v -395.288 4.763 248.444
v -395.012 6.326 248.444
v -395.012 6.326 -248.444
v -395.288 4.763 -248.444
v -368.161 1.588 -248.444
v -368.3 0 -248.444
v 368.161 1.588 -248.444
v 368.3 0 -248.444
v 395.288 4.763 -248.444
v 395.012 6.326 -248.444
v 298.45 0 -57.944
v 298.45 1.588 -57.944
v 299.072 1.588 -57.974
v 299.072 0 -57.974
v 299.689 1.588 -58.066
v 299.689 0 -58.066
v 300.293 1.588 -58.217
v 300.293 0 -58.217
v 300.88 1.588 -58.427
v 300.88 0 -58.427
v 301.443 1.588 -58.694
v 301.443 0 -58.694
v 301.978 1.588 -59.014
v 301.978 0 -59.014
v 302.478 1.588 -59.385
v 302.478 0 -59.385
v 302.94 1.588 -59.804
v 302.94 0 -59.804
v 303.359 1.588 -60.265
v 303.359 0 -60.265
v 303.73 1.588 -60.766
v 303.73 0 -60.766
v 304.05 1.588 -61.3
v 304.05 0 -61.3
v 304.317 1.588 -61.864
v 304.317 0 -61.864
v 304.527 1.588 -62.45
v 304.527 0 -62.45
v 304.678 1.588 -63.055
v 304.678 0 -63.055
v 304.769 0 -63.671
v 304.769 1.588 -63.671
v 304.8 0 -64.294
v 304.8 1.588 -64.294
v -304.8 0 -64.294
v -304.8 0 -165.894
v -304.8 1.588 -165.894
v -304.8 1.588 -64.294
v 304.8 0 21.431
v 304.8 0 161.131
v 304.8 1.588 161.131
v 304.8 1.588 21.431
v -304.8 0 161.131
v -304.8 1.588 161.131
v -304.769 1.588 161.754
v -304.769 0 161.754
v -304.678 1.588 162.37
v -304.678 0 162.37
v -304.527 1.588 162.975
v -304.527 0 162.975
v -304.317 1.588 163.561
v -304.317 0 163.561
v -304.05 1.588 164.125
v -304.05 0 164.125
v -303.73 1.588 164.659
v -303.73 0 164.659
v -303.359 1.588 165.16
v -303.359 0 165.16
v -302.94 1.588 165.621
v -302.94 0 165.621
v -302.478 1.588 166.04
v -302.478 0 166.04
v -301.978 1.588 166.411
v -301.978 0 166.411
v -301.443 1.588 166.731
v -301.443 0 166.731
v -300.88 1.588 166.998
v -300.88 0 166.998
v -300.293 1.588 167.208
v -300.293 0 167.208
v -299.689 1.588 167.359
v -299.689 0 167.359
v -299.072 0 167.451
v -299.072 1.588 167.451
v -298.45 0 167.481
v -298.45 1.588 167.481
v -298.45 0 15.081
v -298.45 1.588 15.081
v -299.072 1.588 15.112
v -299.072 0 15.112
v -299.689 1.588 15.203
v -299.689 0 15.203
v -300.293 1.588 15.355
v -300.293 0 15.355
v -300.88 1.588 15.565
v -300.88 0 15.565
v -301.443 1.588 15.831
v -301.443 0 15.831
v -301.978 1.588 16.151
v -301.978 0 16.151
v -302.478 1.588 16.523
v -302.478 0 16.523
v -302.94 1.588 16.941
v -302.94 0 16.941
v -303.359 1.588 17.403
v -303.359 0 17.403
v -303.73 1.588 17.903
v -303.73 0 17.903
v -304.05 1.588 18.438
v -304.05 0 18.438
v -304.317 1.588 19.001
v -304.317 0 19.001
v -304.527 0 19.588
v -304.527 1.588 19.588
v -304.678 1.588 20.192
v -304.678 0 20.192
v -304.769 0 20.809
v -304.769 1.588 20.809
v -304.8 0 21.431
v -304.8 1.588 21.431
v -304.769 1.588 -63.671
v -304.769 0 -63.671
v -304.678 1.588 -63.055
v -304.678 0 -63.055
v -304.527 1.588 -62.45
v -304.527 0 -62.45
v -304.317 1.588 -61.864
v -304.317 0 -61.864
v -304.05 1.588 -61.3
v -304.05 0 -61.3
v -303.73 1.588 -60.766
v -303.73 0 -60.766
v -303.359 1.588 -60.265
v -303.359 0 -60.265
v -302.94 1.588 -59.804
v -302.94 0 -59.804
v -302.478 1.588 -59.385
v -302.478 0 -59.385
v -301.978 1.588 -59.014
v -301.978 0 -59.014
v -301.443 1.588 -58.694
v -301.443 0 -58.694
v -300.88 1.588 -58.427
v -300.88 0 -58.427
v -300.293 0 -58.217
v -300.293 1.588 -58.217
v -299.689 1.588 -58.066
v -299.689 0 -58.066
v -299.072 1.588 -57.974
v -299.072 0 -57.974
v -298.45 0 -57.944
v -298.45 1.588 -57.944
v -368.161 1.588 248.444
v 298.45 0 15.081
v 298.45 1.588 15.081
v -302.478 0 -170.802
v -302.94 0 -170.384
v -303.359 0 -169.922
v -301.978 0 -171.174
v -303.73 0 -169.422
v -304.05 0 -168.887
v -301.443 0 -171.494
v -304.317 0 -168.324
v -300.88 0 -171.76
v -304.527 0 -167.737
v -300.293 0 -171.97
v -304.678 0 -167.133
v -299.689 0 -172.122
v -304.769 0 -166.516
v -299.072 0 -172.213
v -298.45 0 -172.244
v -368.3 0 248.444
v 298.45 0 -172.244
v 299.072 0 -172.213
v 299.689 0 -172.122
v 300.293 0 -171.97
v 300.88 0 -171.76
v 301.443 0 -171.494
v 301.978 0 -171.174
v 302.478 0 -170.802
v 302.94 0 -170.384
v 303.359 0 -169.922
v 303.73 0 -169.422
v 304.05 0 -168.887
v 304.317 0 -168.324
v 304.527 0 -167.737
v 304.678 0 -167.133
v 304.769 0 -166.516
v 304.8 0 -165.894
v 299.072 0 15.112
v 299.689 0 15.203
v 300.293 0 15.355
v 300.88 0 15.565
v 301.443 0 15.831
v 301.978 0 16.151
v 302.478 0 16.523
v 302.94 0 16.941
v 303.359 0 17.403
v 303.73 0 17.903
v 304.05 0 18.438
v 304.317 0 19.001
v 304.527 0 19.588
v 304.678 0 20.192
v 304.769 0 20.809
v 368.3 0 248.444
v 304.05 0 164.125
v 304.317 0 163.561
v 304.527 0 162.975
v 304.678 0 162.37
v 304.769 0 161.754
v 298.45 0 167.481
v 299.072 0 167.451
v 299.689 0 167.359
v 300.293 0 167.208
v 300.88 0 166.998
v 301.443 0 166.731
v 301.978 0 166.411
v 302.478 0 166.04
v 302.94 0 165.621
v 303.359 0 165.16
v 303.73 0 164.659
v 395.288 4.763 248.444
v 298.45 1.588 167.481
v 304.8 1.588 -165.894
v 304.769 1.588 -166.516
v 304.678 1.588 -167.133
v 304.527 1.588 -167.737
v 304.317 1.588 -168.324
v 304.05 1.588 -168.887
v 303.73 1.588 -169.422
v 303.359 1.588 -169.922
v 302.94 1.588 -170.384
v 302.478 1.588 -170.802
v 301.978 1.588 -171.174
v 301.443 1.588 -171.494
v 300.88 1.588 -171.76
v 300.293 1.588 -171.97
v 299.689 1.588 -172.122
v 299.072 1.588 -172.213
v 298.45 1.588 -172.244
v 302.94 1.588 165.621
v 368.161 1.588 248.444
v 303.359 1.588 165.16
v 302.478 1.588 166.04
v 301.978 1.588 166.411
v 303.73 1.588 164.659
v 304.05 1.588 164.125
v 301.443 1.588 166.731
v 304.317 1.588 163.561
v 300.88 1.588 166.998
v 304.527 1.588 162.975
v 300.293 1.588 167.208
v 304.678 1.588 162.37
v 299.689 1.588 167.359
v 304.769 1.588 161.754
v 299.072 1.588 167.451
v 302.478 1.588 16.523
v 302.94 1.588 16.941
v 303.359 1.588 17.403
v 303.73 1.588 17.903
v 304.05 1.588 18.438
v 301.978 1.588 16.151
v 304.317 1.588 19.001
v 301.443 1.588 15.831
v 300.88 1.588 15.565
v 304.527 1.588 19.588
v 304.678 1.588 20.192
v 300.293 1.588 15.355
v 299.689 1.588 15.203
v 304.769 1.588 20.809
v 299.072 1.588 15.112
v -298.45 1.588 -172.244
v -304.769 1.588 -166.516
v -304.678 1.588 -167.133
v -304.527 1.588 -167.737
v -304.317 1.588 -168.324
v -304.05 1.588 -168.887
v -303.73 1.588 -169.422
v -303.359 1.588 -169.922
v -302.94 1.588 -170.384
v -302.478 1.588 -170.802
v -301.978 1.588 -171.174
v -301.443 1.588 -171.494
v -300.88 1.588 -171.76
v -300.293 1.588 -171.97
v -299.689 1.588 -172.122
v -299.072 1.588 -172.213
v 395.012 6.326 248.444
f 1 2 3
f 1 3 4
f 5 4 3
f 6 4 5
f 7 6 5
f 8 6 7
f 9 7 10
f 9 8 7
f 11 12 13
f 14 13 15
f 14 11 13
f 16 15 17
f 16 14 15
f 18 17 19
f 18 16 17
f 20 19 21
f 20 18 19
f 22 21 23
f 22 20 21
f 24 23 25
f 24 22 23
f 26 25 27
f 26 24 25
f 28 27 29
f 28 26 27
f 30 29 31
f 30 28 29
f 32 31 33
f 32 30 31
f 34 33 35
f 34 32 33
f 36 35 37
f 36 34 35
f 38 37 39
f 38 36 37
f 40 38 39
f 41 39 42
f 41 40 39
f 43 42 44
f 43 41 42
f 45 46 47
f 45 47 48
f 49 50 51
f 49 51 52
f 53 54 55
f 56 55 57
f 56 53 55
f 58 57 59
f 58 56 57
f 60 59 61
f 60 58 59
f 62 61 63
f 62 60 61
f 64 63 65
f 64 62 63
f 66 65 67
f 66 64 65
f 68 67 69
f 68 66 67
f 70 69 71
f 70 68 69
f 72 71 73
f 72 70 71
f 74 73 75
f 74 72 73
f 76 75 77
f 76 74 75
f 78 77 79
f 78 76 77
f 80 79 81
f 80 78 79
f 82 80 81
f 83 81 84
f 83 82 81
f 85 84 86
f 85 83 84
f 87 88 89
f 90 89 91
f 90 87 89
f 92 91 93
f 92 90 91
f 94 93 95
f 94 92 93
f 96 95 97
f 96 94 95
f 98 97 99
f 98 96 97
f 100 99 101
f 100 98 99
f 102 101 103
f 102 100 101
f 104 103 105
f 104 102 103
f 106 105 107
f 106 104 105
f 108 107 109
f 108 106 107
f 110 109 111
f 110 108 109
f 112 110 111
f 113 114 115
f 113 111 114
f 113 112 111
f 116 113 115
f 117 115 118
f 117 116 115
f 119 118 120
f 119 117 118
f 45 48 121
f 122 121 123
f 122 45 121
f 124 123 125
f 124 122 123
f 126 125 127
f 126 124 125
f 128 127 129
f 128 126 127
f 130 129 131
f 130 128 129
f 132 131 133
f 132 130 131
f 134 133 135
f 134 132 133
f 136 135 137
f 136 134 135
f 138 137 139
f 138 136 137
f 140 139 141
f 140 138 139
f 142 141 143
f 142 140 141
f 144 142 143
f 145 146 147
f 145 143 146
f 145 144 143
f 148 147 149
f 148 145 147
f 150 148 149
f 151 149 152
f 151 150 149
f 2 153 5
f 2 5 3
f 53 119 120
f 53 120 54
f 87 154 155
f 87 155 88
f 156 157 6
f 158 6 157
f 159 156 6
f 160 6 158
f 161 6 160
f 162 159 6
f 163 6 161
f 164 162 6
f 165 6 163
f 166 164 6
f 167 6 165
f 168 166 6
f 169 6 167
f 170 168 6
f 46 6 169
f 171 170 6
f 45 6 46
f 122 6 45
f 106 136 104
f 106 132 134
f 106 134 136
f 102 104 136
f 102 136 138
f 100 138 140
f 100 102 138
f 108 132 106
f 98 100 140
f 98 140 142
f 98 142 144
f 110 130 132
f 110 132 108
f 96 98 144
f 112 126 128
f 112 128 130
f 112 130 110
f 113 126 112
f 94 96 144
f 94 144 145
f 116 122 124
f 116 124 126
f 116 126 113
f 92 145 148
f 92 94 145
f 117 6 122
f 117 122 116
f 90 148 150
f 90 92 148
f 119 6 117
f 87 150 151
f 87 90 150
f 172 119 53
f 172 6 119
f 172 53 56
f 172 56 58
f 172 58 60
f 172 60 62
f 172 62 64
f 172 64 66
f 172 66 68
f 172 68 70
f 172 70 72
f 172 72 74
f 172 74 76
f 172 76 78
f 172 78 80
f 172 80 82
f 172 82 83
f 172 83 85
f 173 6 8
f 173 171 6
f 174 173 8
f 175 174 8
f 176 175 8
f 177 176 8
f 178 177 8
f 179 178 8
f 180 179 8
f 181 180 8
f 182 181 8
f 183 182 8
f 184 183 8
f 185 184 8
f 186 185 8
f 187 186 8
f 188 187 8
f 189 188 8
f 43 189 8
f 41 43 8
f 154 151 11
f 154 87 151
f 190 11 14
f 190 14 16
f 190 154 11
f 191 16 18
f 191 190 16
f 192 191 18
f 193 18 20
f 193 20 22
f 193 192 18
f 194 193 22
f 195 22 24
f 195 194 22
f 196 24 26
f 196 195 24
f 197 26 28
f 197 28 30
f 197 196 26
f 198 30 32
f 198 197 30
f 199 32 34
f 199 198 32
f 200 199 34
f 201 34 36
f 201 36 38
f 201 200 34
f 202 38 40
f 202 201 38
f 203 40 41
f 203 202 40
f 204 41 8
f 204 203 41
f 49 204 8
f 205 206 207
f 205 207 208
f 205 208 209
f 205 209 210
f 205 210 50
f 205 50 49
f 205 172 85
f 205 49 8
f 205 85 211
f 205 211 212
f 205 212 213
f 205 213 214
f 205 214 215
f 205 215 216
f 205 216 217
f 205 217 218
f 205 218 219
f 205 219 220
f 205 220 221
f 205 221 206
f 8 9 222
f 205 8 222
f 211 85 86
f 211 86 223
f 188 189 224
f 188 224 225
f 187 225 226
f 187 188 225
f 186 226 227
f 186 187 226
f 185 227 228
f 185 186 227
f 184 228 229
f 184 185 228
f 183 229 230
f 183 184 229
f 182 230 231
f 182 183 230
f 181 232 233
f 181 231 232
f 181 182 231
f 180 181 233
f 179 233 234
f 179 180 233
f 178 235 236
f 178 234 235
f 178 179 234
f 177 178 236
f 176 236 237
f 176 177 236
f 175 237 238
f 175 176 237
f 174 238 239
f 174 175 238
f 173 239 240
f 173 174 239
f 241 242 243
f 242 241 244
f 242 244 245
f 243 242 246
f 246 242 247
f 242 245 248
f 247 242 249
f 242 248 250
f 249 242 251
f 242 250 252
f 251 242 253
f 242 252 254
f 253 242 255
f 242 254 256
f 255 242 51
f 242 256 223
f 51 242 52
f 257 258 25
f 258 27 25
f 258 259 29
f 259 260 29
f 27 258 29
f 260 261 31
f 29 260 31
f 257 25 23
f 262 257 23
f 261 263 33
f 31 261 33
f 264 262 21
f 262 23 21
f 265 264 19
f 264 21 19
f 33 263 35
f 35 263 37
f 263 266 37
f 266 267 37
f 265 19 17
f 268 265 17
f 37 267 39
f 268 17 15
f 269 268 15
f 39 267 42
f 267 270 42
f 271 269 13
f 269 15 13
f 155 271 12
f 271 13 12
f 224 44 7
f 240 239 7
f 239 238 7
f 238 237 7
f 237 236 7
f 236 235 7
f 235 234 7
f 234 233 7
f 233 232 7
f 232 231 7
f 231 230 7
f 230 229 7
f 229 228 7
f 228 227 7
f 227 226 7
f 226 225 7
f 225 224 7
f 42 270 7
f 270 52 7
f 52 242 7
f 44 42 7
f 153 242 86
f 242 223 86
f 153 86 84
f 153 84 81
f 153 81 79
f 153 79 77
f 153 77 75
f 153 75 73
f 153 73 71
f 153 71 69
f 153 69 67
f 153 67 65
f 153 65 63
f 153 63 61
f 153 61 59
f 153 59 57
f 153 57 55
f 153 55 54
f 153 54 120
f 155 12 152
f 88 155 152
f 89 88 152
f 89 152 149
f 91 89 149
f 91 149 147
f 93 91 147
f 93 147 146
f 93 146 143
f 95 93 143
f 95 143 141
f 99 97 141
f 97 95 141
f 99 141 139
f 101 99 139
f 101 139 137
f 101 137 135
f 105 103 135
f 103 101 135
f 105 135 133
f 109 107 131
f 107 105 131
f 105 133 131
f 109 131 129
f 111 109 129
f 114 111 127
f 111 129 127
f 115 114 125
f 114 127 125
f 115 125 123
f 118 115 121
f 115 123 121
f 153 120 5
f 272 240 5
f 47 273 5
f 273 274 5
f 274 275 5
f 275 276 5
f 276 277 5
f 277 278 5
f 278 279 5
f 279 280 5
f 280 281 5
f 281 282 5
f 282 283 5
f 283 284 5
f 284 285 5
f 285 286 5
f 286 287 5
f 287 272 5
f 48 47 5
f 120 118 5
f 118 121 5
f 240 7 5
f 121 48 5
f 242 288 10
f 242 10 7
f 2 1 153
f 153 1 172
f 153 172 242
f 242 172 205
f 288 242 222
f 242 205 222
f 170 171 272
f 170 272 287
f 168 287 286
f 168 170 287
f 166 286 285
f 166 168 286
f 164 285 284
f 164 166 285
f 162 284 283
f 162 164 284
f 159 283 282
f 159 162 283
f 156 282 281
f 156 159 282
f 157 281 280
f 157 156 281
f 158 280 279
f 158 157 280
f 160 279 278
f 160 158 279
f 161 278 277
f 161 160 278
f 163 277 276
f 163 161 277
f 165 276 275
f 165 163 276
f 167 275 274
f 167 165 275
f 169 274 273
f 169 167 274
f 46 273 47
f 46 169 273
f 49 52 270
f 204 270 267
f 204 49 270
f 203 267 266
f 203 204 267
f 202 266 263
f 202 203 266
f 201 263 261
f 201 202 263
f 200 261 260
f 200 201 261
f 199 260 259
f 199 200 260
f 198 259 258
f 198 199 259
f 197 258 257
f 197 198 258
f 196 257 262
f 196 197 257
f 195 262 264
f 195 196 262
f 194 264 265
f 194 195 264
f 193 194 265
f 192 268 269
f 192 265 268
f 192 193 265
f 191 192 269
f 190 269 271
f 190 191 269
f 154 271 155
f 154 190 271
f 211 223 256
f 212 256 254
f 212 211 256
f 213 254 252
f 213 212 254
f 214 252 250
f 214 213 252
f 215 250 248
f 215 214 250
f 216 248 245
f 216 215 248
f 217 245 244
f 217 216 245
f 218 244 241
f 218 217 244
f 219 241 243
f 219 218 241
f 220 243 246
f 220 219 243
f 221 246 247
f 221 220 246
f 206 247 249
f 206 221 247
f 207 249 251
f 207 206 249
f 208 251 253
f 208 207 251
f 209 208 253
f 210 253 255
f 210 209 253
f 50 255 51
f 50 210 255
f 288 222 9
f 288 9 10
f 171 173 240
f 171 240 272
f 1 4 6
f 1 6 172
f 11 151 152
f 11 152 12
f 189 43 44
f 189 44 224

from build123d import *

# Parameters (mm, degrees)
F0_W     = 790.575
F0_H     = 496.8875
F1_DEPTH = 76.2
F2_SIZE2 = 4.7625
F2_SIZE  = 26.9875
F4_START = -248.44475
F4_DEPTH = 496.8895


with BuildPart() as f1:
    # F0 (on Front) → F1 (new body)
    with BuildSketch(Plane.XZ):
        Rectangle(F0_W, F0_H)
        with BuildLine():
            Line((-298.45, -57.94375), (298.45, -57.94375))
            ThreePointArc((298.45, -57.94375), (302.9401280605, -59.8036219395), (304.8, -64.29375))
            Line((304.8, -64.29375), (304.8, -165.89375))
            ThreePointArc((304.8, -165.89375), (302.9401280605, -170.3838780605), (298.45, -172.24375))
            Line((298.45, -172.24375), (-298.45, -172.24375))
            ThreePointArc((-298.45, -172.24375), (-302.9401280605, -170.3838780605), (-304.8, -165.89375))
            Line((-304.8, -165.89375), (-304.8, -64.29375))
            ThreePointArc((-304.8, -64.29375), (-302.9401280605, -59.8036219395), (-298.45, -57.94375))
        make_face(mode=Mode.SUBTRACT)
        with BuildLine():
            Line((-298.45, 167.48125), (298.45, 167.48125))
            ThreePointArc((298.45, 167.48125), (302.9401280605, 165.6213780605), (304.8, 161.13125))
            Line((304.8, 161.13125), (304.8, 21.43125))
            ThreePointArc((304.8, 21.43125), (302.9401280605, 16.9411219395), (298.45, 15.08125))
            Line((298.45, 15.08125), (-298.45, 15.08125))
            ThreePointArc((-298.45, 15.08125), (-302.9401280605, 16.9411219395), (-304.8, 21.43125))
            Line((-304.8, 21.43125), (-304.8, 161.13125))
            ThreePointArc((-304.8, 161.13125), (-302.9401280605, 165.6213780605), (-298.45, 167.48125))
        make_face(mode=Mode.SUBTRACT)
    extrude(amount=-F1_DEPTH)

    # F2
    f2_edges = [f1.edges().sort_by_distance(p)[0] for p in [
        (-395.2875, 0, 0),
        (395.2875, 0, 0),
    ]]
    f2_side = f1.faces().sort_by_distance((0, 0, -2.004685))[0]
    chamfer(f2_edges, length=F2_SIZE, length2=F2_SIZE2, reference=f2_side)

    # F3 (on Top) → F4 (intersect)
    with BuildSketch(Plane.XY.offset(F4_START)):
        Polygon((-395.2875, 4.7625), (-368.3, 0), (368.3, 0), (395.2875, 4.7625), (395.0116157824, 6.3258438996), (368.1610003512, 1.5875), (-368.1610003512, 1.5875), (-395.0116157824, 6.3258438996), align=None)
    extrude(amount=F4_DEPTH, mode=Mode.INTERSECT)


solid = f1.part
